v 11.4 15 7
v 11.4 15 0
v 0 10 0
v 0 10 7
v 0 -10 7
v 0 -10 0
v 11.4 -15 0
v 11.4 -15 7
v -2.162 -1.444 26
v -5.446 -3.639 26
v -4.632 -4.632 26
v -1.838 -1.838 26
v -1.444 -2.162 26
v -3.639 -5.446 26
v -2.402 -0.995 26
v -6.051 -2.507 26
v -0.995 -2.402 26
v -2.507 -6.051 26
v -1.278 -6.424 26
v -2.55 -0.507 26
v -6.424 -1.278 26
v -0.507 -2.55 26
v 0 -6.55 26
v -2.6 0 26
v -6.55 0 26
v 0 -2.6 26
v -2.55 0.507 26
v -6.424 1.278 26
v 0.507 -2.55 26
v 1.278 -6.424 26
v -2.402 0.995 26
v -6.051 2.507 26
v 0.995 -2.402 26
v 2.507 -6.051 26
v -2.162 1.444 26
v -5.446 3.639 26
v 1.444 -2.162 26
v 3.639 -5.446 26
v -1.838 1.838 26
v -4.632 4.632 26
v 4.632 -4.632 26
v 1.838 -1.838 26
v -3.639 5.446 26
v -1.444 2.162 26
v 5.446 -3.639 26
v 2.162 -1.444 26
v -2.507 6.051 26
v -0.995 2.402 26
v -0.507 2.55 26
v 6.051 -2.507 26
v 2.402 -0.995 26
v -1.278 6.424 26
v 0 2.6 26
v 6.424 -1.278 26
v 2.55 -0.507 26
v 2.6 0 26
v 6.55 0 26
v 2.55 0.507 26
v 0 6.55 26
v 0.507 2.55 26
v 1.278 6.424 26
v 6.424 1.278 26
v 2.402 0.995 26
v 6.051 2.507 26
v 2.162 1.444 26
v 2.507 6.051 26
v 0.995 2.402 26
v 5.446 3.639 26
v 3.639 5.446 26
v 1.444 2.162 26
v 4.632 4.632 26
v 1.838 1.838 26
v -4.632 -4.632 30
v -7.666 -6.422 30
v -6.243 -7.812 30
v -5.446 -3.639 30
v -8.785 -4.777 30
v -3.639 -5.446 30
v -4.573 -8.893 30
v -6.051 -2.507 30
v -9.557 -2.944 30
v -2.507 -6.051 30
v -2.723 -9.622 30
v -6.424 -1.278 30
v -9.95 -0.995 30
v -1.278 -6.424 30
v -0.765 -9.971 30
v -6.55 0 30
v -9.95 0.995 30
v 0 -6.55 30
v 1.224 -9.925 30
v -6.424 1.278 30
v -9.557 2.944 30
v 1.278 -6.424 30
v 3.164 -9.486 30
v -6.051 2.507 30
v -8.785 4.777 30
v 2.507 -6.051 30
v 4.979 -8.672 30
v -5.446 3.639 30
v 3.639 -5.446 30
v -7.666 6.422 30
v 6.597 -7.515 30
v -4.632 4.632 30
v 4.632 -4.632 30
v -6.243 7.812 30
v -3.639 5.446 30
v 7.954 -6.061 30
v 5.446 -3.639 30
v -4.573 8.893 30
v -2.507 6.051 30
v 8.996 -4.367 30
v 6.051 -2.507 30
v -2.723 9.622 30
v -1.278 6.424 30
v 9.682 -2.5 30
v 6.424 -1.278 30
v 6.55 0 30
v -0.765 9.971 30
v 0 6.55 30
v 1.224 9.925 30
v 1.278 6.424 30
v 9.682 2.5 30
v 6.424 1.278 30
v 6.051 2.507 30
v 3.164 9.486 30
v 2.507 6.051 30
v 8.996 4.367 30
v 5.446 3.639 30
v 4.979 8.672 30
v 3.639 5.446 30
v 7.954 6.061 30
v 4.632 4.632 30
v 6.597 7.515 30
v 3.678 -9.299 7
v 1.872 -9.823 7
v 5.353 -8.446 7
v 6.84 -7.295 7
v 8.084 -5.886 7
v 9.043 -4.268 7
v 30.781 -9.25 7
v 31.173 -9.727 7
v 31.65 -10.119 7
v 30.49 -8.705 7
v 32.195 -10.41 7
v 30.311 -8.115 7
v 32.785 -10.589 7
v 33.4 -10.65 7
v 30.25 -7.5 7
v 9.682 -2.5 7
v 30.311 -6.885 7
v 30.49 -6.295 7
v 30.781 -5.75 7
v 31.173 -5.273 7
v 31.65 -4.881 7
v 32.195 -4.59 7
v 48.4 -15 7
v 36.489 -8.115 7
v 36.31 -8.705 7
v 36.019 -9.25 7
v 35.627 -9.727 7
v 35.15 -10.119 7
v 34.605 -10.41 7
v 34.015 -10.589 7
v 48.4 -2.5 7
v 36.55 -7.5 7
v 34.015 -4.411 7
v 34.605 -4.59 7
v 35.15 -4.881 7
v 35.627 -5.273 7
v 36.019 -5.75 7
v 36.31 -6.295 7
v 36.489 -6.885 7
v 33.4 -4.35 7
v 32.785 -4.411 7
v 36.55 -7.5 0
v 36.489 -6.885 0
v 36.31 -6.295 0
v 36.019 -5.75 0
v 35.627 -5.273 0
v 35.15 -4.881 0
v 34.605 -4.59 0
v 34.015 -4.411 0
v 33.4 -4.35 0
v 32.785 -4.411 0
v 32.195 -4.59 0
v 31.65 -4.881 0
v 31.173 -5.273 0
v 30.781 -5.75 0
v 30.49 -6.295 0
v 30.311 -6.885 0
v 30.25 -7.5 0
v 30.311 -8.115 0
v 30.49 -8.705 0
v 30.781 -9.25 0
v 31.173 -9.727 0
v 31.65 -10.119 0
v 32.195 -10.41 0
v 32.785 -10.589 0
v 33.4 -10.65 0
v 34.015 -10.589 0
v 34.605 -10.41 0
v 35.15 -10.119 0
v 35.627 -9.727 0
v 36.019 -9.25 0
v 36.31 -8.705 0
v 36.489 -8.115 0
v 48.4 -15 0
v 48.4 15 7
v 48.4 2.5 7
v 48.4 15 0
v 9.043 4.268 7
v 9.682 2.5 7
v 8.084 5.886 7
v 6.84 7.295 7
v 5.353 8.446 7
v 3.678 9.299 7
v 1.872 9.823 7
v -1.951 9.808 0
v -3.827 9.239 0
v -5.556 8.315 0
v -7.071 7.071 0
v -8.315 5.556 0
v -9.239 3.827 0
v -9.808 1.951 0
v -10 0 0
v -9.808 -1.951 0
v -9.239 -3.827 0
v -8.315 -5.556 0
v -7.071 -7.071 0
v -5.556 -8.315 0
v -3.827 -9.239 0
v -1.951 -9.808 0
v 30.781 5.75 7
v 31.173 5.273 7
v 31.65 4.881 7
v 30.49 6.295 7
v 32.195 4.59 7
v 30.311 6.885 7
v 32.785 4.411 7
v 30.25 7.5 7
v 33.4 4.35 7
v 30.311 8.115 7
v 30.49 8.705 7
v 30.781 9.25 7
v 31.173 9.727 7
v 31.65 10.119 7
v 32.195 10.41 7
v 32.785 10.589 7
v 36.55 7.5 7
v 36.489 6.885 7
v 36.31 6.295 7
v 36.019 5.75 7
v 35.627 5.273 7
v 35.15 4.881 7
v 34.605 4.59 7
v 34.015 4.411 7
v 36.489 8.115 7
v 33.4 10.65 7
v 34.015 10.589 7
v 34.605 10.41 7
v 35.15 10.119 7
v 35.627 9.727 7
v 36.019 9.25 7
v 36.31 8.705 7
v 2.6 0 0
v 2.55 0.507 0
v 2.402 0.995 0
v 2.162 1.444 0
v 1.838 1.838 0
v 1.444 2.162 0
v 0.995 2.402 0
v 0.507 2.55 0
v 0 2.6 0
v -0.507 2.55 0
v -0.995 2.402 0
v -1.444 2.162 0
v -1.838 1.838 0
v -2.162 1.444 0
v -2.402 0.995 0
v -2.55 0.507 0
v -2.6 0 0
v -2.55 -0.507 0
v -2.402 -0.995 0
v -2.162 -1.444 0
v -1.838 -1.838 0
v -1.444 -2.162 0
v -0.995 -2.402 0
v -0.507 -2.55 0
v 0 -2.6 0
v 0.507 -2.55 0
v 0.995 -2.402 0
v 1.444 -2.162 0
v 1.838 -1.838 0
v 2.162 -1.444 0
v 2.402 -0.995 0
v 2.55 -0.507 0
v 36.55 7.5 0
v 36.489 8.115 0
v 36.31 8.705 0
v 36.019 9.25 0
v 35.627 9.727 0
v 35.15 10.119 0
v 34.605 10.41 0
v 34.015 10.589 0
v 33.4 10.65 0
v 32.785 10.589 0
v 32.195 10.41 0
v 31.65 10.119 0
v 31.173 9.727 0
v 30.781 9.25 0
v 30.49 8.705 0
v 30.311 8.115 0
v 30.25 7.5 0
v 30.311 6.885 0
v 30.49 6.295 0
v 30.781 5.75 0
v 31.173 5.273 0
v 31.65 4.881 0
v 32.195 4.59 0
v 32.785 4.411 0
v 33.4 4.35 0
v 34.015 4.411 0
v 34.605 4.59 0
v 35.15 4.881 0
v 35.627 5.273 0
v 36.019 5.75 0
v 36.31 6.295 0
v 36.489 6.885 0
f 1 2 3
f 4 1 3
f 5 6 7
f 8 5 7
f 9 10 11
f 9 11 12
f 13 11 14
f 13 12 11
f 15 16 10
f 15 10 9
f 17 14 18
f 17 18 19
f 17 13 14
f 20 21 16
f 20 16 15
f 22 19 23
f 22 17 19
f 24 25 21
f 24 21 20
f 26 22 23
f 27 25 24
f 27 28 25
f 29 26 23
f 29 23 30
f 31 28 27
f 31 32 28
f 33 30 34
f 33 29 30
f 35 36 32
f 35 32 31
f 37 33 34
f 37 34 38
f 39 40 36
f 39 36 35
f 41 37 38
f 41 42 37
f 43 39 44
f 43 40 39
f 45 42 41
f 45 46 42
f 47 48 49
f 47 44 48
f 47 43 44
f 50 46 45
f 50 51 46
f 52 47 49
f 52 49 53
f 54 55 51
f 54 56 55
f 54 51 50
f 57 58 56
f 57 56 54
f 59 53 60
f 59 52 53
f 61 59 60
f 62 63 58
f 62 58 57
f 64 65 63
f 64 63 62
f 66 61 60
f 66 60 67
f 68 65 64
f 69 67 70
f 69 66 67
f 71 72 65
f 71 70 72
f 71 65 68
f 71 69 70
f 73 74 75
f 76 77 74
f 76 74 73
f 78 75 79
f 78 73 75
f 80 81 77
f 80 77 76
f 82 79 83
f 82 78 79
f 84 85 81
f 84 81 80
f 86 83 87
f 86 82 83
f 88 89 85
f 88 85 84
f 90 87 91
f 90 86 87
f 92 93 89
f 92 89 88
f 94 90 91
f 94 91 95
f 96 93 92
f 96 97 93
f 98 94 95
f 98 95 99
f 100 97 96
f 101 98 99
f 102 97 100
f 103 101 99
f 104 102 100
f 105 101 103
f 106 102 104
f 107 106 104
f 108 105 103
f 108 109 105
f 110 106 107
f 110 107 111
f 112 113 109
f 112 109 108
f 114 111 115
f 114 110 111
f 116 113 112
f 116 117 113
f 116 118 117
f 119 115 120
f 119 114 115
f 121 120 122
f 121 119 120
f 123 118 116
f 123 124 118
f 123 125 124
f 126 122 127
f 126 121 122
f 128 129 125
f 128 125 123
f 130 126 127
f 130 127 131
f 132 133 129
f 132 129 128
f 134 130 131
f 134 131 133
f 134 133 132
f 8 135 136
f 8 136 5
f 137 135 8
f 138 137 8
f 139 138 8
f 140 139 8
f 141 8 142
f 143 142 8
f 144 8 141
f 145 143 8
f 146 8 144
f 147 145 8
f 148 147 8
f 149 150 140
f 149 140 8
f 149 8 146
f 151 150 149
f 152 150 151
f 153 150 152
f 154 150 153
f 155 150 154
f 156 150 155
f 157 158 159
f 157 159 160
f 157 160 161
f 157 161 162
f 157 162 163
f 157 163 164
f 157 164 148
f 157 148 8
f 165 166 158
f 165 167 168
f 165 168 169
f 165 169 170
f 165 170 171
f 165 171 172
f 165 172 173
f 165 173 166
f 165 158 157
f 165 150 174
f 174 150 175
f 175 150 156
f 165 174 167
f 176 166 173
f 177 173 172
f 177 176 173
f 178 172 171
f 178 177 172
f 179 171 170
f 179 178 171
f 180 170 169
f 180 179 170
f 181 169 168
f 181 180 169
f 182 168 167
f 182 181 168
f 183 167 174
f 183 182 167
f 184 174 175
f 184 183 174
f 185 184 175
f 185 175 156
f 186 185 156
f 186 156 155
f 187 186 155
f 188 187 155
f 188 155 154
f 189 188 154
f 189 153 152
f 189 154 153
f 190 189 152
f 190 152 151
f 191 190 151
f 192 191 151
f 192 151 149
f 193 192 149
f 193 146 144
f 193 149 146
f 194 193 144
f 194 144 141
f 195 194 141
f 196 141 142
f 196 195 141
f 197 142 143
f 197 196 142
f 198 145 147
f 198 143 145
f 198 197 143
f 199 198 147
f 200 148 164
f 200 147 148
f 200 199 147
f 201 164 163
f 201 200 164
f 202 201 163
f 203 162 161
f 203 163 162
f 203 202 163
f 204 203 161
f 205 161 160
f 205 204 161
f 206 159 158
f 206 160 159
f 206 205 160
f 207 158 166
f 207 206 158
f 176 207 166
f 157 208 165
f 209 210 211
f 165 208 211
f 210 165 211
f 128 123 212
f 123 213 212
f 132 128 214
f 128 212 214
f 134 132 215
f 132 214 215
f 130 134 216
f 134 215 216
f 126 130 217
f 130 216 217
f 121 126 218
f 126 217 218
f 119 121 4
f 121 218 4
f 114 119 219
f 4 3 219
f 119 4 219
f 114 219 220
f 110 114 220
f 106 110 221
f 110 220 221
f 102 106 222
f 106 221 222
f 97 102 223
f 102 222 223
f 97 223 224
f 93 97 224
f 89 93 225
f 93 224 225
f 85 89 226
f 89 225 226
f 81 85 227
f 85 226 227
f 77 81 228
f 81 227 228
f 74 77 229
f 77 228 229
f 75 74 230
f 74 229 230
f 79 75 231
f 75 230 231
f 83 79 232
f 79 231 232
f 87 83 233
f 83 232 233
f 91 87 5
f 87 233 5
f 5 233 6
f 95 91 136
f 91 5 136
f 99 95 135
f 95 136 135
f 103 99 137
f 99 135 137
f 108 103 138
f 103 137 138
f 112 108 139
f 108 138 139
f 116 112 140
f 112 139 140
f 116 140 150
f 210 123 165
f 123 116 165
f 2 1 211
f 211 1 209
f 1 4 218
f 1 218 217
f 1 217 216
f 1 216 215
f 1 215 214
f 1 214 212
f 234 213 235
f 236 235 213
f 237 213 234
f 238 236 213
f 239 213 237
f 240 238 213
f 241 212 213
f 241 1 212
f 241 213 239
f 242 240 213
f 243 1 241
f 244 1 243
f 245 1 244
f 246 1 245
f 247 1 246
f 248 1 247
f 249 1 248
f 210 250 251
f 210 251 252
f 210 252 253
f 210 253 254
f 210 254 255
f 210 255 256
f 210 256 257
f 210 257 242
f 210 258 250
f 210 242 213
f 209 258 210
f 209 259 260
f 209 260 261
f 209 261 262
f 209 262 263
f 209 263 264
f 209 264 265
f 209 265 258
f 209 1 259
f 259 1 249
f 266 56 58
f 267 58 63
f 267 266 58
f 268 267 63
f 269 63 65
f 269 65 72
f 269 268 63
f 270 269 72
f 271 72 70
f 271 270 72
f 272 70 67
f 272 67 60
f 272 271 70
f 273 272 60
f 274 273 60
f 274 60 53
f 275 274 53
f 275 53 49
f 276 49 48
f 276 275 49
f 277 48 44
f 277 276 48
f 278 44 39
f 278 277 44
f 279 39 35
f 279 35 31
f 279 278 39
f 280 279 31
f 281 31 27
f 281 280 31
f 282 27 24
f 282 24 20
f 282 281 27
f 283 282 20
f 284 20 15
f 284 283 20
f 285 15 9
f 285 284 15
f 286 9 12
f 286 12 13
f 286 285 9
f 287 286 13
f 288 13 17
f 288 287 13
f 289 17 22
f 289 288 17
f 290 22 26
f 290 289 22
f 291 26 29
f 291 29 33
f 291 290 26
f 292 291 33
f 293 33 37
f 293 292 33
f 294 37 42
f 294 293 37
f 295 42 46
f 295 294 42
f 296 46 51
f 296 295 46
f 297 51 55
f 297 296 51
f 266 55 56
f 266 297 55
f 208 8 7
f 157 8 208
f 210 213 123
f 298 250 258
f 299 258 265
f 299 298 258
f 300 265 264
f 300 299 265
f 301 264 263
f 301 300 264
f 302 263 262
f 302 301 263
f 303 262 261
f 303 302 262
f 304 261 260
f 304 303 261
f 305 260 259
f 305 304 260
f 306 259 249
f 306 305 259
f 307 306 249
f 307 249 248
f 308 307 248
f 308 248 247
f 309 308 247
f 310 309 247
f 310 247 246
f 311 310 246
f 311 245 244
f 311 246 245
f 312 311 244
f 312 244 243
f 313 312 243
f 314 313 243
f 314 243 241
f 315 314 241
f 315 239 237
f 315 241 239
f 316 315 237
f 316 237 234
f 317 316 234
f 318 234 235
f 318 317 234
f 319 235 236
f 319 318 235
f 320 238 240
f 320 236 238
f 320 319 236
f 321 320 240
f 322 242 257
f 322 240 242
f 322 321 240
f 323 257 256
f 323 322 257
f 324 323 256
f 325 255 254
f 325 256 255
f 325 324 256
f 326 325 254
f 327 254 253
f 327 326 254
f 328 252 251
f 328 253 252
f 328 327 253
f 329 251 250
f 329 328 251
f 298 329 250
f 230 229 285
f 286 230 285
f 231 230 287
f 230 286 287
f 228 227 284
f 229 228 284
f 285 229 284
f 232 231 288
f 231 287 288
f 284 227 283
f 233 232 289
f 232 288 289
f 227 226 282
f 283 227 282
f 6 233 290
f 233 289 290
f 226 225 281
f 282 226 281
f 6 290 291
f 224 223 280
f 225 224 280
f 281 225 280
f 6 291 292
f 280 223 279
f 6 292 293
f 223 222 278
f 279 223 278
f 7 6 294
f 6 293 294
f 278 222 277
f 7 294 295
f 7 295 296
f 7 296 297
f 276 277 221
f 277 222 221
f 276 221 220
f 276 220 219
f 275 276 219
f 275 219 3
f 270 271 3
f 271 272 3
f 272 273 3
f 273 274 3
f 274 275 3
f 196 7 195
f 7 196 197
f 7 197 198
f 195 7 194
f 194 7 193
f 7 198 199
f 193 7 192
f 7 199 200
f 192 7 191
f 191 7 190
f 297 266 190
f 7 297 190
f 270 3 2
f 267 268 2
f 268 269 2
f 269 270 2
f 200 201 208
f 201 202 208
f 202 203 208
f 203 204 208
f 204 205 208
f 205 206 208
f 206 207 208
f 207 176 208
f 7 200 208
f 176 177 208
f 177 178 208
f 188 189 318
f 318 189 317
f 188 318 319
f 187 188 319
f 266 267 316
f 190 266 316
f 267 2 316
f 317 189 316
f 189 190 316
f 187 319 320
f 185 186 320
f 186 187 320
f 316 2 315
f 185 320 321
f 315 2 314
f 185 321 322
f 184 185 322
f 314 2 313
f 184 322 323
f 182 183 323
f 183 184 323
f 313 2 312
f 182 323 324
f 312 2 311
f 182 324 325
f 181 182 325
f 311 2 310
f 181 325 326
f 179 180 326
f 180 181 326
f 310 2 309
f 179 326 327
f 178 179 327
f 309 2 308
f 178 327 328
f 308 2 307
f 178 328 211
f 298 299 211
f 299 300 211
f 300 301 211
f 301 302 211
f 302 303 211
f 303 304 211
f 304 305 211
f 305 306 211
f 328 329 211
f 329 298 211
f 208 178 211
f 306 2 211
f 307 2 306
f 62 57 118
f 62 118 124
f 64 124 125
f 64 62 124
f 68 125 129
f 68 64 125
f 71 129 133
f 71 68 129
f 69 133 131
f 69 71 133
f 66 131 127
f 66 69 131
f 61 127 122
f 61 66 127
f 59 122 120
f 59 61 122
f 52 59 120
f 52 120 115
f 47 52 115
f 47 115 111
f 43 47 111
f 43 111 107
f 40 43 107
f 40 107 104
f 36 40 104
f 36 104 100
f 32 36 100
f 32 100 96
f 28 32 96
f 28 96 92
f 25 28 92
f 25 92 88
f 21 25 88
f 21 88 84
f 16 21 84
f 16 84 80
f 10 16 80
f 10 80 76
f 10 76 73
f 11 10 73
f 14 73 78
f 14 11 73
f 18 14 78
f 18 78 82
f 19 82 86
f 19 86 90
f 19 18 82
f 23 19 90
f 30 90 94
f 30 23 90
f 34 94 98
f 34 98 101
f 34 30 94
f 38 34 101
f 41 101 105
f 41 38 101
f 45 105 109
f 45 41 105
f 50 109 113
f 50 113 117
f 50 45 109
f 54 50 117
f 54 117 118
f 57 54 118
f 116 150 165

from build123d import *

# Parameters (mm, degrees)
F0_R      = 10
F0_R_2    = 6.55
F1_DEPTH  = 30
F0_R_3    = 2.6
F2_DEPTH  = 26
F3_W      = 7
F3_H      = 30
F3_W_2    = 30
F4_DEPTH  = 7
F5_DEPTH  = 30
F6_W      = 40
F6_H      = 5
F7_DEPTH  = 23
F9_DEPTH  = 25
F10_R     = 3.15
F11_DEPTH = 25
F12_R     = 3.15
F13_DEPTH = 25
F15_DEPTH = 30.001


with BuildPart() as f1:
    # F0 (on Top) → F1 (new body)
    with BuildSketch(Plane.XY):
        Circle(F0_R)
        Circle(F0_R_2, mode=Mode.SUBTRACT)
    extrude(amount=F1_DEPTH)

    # F0 (on Top) → F2 (join)
    with BuildSketch(Plane.XY):
        Circle(F0_R_2)
        Circle(F0_R_3, mode=Mode.SUBTRACT)
    extrude(amount=F2_DEPTH)

    # F3 (on Top) → F4 (join)
    with BuildSketch(Plane.XY):
        with BuildLine():
            Line((11.4, -15), (11.4, 15))
            Line((11.4, 15), (0, 10))
            ThreePointArc((0, 10), (7.071068, 7.071068), (10, 0))
            ThreePointArc((10, 0), (7.071068, -7.071068), (0, -10))
            Line((0, -10), (11.4, -15))
        make_face()
        with Locations((14.9, 0)):
            Rectangle(F3_W, F3_H)
        with Locations((33.4, 0)):
            Rectangle(F3_W_2, F3_H)
    extrude(amount=F4_DEPTH)

    # F3 (on Top) → F5 (join)
    with BuildSketch(Plane.XY):
        with Locations((14.9, 0)):
            Rectangle(F3_W, F3_H)
    extrude(amount=-F5_DEPTH)

    # F6 (on face) → F7 (join, through all)
    with BuildSketch(Plane.XY.offset(7)):
        with Locations((28.4, 0)):
            Rectangle(F6_W, F6_H)
    extrude(amount=F7_DEPTH)

    # F8 (on face) → F9 (cut)
    with BuildSketch(Plane.XZ.offset(2.5)):
        Polygon((48.4, 30), (9.682458, 30), (48.4, 7), align=None)
    extrude(amount=-F9_DEPTH, mode=Mode.SUBTRACT)

    # F10 (on face) → F11 (cut)
    with BuildSketch(Plane.YZ.offset(18.4)):
        with Locations((-7.5, -15)):
            Circle(F10_R)
        with Locations((7.5, -15)):
            Circle(F10_R)
    extrude(amount=-F11_DEPTH, mode=Mode.SUBTRACT)

    # F12 (on face) → F13 (cut)
    with BuildSketch(Plane.XY):
        with Locations((33.4, -7.5)):
            Circle(F12_R)
        with Locations((33.4, 7.5)):
            Circle(F12_R)
    extrude(amount=F13_DEPTH, mode=Mode.SUBTRACT)

    # F14 (on face) → F15 (cut, through all)
    with BuildSketch(Plane.XZ.offset(15)):
        Polygon((51.2021, -41.370519), (48.4, 0), (-16.937578, 0), (-15.380099, -41.370519), align=None)
    extrude(amount=-F15_DEPTH, mode=Mode.SUBTRACT)


solid = f1.part
